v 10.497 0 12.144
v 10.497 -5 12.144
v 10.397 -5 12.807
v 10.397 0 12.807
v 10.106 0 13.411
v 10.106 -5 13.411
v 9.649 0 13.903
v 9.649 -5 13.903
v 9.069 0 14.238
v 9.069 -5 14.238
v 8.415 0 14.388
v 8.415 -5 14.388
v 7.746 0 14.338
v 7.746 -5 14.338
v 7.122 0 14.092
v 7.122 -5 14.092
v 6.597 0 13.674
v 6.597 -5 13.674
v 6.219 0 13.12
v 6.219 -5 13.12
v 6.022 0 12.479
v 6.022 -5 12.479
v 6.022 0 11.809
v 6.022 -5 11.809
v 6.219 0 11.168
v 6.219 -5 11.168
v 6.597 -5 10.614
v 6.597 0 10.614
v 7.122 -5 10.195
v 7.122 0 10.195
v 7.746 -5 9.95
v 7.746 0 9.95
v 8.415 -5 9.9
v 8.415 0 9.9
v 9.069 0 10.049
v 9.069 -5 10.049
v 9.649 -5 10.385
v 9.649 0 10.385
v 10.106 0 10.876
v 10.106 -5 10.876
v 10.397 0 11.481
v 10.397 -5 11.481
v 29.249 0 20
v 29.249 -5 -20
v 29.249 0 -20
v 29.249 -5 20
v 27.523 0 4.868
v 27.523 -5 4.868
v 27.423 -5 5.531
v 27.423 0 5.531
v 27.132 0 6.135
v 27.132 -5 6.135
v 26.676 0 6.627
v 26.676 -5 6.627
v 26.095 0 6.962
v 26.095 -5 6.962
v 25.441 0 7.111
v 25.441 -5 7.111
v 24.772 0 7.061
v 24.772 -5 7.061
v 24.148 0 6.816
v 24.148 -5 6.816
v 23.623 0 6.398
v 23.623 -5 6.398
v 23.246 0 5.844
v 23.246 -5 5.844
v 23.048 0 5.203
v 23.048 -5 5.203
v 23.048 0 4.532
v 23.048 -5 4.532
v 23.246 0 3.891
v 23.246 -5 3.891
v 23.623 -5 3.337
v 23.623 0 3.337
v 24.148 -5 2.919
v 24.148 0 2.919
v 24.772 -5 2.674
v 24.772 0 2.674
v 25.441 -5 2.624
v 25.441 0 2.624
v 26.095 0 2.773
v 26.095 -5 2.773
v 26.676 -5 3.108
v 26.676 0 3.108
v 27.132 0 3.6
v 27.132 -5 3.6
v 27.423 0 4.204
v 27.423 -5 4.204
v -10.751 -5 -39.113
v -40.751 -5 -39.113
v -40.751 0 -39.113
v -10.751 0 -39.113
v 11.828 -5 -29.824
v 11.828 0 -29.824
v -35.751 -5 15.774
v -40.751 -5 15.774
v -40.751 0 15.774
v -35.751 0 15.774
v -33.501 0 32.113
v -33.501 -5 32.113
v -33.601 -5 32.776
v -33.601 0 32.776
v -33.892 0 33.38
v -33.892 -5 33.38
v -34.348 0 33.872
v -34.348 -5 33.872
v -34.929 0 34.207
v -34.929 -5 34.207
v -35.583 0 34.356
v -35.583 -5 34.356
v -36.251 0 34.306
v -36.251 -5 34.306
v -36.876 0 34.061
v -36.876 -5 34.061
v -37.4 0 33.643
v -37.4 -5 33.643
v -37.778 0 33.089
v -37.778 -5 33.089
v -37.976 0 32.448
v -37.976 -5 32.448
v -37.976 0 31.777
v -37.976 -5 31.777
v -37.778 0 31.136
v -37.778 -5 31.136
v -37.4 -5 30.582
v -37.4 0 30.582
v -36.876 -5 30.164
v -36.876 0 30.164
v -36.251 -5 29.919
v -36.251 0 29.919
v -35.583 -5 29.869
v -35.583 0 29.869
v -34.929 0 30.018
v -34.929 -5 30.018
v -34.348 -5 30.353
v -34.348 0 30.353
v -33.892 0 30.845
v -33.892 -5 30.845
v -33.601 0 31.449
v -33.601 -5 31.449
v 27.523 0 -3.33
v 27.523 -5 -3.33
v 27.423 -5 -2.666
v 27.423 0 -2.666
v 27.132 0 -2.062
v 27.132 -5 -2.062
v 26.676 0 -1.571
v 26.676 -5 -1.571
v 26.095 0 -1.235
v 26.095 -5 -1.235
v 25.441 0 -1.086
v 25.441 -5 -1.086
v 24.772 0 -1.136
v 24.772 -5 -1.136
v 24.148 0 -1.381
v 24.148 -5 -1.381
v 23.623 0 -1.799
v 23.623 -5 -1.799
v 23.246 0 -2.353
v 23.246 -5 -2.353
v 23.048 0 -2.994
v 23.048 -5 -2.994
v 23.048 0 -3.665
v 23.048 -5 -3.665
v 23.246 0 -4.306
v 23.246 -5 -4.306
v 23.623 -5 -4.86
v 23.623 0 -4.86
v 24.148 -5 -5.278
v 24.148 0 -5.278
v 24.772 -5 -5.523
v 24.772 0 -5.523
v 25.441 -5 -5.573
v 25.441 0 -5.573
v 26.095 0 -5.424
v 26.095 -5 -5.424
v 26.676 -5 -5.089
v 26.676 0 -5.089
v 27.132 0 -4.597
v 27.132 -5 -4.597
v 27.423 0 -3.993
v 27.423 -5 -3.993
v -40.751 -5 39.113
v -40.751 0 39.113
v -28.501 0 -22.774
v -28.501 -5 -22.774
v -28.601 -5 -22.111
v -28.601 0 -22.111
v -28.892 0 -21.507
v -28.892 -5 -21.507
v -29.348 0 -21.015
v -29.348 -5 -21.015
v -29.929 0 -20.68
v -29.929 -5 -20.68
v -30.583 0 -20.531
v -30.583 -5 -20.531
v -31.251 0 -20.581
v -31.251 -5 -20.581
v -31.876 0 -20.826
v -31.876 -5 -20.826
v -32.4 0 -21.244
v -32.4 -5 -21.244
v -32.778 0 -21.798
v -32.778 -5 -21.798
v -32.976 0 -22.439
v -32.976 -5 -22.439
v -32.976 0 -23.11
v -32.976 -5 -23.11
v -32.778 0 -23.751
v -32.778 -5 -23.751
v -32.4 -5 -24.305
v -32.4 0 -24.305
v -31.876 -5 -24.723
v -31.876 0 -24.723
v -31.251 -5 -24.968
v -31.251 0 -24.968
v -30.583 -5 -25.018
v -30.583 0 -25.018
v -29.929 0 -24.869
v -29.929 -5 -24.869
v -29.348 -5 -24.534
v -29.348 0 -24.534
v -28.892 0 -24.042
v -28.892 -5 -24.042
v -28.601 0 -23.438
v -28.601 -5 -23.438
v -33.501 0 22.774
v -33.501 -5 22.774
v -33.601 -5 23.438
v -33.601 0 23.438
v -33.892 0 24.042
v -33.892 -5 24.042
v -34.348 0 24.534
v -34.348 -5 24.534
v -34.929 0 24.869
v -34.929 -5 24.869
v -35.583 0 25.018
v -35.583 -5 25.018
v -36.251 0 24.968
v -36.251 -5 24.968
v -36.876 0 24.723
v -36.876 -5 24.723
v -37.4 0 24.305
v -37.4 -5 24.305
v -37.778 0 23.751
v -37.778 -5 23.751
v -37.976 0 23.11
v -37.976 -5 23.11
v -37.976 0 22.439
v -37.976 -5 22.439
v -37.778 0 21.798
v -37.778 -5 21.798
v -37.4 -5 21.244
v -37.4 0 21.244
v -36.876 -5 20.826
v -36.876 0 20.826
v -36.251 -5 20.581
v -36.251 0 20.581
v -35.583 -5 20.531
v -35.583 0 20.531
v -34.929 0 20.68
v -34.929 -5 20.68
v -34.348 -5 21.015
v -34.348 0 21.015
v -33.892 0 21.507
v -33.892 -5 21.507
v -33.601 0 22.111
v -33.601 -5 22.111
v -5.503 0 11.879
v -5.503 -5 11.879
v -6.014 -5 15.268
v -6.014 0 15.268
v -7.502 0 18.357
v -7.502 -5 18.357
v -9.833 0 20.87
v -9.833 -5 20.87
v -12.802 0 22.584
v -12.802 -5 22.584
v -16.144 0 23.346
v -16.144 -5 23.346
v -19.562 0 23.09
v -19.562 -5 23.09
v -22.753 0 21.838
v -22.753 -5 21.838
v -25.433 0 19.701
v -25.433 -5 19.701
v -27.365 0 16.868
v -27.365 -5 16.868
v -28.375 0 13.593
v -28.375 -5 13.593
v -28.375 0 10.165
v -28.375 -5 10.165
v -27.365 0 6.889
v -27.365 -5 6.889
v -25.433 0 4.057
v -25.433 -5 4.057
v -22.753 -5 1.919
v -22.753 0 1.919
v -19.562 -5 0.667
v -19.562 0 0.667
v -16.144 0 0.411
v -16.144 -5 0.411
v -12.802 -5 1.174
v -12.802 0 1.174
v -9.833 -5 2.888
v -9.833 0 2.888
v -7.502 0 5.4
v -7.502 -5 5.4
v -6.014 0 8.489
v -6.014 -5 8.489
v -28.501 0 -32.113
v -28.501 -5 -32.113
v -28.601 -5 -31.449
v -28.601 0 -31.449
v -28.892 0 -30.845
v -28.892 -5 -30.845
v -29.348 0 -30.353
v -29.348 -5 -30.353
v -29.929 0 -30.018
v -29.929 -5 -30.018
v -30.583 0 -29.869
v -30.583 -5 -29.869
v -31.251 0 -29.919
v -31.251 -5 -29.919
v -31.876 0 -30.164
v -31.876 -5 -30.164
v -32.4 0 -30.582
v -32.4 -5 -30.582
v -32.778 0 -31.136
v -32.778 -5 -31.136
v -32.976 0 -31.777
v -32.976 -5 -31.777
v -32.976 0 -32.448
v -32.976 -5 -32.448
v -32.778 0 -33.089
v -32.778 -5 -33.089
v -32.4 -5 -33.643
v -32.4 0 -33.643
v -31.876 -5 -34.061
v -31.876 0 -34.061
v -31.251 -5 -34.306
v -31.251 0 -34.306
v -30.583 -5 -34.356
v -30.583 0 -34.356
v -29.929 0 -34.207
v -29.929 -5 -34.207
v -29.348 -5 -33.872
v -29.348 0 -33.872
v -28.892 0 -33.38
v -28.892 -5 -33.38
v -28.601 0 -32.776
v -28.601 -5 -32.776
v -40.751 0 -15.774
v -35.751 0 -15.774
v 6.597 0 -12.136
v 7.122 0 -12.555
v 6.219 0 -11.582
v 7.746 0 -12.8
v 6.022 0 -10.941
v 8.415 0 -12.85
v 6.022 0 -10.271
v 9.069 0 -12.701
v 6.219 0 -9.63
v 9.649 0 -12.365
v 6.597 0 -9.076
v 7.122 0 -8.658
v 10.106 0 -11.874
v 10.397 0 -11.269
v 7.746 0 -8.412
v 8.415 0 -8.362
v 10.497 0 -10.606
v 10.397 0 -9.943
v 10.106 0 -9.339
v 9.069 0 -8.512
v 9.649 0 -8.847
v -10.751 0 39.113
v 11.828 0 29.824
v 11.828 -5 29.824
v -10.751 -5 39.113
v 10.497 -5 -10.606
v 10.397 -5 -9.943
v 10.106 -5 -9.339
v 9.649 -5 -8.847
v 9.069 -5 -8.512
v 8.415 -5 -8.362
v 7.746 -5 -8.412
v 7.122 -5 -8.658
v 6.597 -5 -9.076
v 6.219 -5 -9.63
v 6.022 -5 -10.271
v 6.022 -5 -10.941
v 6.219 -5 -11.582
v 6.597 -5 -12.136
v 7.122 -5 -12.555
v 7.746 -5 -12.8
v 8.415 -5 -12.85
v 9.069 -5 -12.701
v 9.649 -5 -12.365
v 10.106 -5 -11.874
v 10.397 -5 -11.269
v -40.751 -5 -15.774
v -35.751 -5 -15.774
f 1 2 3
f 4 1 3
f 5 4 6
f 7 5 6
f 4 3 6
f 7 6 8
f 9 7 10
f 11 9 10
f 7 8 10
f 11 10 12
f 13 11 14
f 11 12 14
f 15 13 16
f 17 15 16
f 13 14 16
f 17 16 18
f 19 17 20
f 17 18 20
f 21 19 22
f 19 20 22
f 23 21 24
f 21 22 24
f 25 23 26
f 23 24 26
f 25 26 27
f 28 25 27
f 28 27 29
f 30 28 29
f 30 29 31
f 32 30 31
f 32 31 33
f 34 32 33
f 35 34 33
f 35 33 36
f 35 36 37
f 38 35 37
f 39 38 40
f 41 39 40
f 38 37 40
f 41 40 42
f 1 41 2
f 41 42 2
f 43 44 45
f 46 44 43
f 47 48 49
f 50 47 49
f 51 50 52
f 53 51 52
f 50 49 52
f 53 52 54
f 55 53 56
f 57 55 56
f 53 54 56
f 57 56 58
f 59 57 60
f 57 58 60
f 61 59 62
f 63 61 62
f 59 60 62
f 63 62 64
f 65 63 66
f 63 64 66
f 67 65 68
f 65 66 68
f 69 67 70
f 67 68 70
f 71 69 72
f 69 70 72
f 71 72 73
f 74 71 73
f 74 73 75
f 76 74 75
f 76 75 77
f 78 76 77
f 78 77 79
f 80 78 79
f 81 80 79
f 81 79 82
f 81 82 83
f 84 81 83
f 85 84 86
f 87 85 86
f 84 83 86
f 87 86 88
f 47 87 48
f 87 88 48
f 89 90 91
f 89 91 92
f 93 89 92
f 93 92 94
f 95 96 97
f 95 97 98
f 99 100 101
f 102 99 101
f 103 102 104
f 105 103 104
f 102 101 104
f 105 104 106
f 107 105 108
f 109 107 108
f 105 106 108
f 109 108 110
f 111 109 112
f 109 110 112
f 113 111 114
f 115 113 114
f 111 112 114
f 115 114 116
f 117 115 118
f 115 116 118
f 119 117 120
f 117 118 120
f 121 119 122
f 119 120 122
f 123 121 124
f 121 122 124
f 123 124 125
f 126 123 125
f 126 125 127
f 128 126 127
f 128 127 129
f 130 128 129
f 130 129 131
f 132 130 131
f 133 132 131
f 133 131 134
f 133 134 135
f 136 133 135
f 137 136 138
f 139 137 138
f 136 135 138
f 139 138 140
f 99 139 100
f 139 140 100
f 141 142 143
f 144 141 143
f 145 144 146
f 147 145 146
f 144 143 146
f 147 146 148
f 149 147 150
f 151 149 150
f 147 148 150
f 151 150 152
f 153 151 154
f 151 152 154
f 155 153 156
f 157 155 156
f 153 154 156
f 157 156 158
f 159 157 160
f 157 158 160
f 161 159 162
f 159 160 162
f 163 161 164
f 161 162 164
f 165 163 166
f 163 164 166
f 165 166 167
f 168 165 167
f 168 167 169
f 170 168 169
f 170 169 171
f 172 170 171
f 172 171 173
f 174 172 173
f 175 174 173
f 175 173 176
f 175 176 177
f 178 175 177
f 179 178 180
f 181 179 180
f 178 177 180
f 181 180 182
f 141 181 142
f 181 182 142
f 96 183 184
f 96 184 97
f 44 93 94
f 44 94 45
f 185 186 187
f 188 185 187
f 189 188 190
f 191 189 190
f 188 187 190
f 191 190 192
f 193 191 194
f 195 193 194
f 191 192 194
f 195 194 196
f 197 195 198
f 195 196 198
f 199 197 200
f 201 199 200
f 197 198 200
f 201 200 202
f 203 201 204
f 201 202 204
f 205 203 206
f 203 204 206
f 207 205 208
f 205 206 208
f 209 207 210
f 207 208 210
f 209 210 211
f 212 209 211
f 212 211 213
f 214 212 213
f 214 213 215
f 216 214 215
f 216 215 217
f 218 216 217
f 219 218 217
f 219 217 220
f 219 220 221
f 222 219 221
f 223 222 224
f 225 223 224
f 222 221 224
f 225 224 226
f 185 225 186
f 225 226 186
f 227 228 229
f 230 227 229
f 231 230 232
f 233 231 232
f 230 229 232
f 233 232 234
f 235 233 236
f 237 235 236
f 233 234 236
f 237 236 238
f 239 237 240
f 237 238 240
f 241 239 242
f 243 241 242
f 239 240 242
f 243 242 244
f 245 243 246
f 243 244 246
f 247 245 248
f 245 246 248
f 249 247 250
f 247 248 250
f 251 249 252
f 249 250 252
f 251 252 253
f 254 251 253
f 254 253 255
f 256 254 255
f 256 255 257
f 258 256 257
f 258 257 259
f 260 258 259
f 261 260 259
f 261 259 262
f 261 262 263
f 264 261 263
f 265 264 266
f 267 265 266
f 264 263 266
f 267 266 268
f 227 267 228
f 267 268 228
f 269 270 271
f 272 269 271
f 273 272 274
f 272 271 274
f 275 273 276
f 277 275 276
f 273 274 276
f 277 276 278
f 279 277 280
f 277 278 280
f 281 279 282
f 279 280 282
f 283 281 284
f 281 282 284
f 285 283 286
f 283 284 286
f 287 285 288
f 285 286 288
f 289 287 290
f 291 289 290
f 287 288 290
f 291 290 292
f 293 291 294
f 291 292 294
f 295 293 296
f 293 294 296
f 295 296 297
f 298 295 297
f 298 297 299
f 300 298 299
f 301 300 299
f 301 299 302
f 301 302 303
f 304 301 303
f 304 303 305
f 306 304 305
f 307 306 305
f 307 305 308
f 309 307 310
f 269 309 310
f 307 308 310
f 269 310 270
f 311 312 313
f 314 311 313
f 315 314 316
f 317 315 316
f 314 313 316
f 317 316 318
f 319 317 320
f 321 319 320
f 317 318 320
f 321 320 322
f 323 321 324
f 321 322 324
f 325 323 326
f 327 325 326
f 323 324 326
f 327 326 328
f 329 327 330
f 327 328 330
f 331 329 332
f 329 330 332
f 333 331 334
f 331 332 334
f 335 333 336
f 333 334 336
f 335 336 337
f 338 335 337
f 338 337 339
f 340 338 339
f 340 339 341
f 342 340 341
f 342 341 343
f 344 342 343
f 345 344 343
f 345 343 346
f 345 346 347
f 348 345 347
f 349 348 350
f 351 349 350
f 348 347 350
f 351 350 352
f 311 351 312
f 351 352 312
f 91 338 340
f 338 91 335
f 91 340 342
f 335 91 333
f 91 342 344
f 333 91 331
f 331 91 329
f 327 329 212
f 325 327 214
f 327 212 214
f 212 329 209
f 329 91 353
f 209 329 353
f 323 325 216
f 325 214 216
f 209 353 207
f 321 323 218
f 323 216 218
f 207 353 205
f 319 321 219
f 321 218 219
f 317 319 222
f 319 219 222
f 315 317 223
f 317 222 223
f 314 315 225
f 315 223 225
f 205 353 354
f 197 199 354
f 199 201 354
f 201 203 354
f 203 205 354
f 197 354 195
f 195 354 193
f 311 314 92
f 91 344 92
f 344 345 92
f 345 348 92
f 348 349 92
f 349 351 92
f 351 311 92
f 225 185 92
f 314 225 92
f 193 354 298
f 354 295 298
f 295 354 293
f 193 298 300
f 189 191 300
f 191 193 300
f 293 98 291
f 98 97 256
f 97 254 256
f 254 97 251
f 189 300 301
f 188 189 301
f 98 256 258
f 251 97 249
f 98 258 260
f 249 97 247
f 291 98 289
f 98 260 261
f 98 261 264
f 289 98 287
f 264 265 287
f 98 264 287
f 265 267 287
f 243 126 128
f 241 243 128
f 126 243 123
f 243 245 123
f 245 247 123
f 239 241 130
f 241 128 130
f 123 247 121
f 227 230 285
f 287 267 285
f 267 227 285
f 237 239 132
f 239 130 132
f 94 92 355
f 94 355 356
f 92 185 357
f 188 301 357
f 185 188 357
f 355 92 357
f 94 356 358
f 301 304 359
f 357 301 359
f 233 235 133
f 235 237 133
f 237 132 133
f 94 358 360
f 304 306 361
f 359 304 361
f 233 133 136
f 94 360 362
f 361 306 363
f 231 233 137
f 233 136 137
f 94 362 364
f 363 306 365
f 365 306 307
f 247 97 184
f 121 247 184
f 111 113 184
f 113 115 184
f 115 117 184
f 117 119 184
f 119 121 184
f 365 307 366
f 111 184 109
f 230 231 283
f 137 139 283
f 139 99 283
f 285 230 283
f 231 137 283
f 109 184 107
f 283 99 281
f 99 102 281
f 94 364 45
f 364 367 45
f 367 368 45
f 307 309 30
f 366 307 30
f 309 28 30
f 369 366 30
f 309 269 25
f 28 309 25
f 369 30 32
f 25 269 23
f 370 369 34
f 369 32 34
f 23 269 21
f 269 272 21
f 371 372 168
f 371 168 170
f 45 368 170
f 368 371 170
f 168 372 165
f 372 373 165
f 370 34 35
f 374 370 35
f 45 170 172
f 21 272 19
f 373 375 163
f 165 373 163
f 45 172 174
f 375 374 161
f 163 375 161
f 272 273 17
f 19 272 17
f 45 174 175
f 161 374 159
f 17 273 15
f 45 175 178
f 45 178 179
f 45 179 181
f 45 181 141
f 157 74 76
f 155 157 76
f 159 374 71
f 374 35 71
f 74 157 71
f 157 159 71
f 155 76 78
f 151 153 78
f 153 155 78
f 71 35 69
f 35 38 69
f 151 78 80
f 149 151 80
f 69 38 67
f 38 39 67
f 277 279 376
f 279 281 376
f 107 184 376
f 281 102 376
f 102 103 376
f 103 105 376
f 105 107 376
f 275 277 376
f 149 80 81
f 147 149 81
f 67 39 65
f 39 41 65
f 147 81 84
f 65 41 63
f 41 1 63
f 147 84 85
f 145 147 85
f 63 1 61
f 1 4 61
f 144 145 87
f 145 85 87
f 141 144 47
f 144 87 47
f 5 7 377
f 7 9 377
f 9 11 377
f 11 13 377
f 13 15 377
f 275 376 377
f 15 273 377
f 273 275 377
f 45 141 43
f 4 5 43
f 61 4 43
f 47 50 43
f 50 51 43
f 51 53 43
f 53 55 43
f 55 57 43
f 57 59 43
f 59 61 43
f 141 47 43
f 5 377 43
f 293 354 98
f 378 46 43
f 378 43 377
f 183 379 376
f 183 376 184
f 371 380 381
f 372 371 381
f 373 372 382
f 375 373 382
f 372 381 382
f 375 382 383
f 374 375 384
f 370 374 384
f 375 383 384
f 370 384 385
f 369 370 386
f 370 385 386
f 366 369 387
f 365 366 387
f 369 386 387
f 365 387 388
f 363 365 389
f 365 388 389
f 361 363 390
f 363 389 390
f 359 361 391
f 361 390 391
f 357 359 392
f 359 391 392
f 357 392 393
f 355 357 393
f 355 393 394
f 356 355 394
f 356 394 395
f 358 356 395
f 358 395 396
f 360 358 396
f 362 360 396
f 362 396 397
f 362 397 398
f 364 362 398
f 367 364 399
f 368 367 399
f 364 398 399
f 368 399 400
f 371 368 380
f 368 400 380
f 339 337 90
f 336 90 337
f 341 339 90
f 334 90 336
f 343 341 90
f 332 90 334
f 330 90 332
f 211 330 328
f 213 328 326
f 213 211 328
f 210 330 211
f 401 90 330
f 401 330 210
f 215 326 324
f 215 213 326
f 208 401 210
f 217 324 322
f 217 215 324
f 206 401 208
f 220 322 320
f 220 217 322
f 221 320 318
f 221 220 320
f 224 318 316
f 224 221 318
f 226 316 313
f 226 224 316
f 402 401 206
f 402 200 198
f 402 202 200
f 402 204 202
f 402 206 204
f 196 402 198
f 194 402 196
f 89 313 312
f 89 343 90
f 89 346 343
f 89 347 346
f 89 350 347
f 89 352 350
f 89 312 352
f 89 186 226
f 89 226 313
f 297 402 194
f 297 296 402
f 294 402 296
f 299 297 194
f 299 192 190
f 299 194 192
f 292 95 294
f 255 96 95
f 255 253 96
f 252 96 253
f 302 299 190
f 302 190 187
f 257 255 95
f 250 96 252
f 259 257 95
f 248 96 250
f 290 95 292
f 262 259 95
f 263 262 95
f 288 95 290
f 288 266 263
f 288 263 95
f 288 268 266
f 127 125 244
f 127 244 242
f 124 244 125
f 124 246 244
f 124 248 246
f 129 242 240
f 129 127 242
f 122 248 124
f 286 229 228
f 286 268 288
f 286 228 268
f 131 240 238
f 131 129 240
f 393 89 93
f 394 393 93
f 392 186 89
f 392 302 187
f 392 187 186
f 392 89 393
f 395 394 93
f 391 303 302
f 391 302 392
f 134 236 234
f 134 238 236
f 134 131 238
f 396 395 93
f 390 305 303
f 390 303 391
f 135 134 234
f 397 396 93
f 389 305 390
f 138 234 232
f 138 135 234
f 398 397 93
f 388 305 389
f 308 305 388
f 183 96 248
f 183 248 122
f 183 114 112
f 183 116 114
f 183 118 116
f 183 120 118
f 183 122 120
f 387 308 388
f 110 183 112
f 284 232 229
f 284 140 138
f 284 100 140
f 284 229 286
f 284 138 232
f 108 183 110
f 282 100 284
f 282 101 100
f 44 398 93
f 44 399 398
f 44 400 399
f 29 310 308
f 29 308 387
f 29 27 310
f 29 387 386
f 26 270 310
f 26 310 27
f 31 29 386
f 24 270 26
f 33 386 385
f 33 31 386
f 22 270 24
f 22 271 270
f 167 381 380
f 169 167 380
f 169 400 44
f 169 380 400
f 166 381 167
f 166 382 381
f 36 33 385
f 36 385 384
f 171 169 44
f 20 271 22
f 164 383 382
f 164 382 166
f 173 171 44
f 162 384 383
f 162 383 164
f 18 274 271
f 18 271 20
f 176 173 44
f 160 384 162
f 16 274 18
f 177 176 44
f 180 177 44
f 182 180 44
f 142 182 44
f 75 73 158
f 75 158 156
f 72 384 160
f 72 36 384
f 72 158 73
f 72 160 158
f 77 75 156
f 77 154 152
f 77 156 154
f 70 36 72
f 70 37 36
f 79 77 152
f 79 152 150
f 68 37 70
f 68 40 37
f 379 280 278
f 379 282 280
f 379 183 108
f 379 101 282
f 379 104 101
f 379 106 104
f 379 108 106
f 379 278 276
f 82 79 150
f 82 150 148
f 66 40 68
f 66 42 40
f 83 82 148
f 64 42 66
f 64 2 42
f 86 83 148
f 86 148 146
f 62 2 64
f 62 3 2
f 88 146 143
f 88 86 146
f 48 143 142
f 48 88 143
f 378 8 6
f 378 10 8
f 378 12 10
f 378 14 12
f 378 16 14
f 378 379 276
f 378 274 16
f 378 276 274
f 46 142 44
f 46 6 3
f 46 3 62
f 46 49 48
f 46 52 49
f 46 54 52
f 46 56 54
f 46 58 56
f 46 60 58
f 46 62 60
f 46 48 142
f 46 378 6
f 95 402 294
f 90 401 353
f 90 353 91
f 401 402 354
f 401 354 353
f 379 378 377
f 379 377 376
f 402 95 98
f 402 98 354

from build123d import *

# Parameters (mm, degrees)
SKETCH1_R           = 2.25
SKETCH1_R_2         = 11.5
BOSS_EXTRUDE1_DEPTH = 5


with BuildPart() as part:
    # Sketch1 → Boss-Extrude1 (new body)
    with BuildSketch(Plane.XZ.offset(5)):
        Polygon((-35.75064294, 15.774393454), (-35.75064294, -15.774393454), (-40.75064294, -15.774393454), (-40.75064294, -39.112565995), (-10.75064294, -39.112565995), (11.828174009, -29.823562546), (29.24935706, -20), (29.24935706, 20), (11.828174009, 29.823562546), (-10.75064294, 39.112565995), (-40.75064294, 39.112565995), (-40.75064294, 15.774393454), align=None)
        with Locations((-30.75064294, -22.774393454)):
            Circle(SKETCH1_R, mode=Mode.SUBTRACT)
        with Locations((25.272832985, -3.329685731)):
            Circle(SKETCH1_R, mode=Mode.SUBTRACT)
        with Locations((8.246602308, -10.606066633)):
            Circle(SKETCH1_R, mode=Mode.SUBTRACT)
        with Locations((25.272832985, 4.867552465)):
            Circle(SKETCH1_R, mode=Mode.SUBTRACT)
        with Locations((-30.75064294, -32.112565995)):
            Circle(SKETCH1_R, mode=Mode.SUBTRACT)
        with Locations((-17.003397692, 11.878643261)):
            Circle(SKETCH1_R_2, mode=Mode.SUBTRACT)
        with Locations((8.246602308, 12.143933367)):
            Circle(SKETCH1_R, mode=Mode.SUBTRACT)
        with Locations((-35.75064294, 22.774393454)):
            Circle(SKETCH1_R, mode=Mode.SUBTRACT)
        with Locations((-35.75064294, 32.112565995)):
            Circle(SKETCH1_R, mode=Mode.SUBTRACT)
    extrude(amount=-BOSS_EXTRUDE1_DEPTH)


solid = part.part
